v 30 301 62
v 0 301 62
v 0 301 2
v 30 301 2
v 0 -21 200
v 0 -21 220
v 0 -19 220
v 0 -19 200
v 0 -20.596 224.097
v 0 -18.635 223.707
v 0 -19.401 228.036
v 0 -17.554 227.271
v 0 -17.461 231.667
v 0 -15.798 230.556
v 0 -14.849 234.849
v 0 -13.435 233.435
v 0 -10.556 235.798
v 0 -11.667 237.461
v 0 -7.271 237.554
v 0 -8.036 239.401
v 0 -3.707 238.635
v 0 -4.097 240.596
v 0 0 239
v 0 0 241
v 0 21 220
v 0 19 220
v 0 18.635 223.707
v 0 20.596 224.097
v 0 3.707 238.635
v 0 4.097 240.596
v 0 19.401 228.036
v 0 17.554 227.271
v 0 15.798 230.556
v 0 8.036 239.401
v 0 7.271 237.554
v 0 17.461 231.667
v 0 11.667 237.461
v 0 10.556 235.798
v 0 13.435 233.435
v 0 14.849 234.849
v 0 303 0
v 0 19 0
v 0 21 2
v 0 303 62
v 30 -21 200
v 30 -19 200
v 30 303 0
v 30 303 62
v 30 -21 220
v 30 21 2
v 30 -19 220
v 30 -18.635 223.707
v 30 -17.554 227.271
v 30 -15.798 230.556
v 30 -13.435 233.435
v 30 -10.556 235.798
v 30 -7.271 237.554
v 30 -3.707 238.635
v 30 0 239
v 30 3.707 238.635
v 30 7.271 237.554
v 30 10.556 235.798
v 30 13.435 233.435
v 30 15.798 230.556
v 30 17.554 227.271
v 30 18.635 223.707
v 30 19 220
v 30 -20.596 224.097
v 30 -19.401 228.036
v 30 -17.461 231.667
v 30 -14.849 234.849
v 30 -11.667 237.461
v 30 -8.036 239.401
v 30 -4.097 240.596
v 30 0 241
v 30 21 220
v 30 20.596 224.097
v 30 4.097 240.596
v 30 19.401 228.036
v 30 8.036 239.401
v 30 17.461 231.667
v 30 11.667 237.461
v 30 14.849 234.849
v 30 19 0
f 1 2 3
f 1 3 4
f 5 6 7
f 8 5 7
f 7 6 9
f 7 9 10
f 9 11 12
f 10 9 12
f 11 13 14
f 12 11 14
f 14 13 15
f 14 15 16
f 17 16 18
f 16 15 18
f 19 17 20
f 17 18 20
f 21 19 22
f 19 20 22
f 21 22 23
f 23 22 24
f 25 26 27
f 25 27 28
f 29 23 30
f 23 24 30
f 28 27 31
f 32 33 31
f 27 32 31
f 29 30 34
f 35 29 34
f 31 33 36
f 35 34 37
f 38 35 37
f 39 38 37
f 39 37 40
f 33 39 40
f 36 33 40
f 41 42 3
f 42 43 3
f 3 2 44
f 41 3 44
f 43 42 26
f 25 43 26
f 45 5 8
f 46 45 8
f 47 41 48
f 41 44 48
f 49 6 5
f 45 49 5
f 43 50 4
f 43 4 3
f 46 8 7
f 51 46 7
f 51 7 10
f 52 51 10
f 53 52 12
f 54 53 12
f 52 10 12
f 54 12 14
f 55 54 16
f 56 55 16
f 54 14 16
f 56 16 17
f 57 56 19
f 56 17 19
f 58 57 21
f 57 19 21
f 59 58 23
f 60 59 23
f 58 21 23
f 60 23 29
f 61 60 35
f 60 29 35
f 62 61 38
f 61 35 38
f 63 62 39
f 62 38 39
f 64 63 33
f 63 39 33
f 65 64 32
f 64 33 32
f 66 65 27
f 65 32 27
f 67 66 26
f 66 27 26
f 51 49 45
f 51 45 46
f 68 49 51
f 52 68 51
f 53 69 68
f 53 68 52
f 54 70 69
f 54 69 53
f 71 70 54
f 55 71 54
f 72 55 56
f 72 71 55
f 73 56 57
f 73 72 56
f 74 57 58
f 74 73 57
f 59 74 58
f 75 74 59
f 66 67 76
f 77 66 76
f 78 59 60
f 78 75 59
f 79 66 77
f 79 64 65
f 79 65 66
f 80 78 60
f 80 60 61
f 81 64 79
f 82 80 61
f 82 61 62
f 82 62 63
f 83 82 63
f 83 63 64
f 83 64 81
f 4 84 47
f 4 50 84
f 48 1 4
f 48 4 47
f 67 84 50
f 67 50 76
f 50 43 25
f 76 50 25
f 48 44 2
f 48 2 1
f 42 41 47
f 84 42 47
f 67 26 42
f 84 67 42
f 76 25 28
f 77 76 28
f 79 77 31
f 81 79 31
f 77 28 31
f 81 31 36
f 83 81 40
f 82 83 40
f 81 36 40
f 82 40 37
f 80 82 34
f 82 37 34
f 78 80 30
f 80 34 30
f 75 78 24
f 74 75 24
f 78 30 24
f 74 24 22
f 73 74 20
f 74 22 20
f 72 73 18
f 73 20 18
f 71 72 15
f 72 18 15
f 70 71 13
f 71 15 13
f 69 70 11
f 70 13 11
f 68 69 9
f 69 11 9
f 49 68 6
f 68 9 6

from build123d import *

# Parameters (mm, degrees)
F1_DEPTH      = 30
F2_W          = 30
F2_H          = 2
F3_DEPTH      = 280
F4_W          = 30
F4_H          = 2
F5_DEPTH      = 60
F5_DEPTH_BACK = 2


with BuildPart() as f1:
    # F0 (on Right) → F1 (new body)
    with BuildSketch(Plane.YZ):
        with BuildLine():
            ThreePointArc((-19, 220), (0, 239), (19, 220))
            Line((19, 220), (19, 0))
            Line((19, 0), (21, 0))
            Line((21, 0), (21, 220))
            ThreePointArc((21, 220), (0, 241), (-21, 220))
            Line((-21, 220), (-21, 200))
            Line((-21, 200), (-19, 200))
            Line((-19, 200), (-19, 220))
        make_face()
    extrude(amount=F1_DEPTH)

    # F2 (on face) → F3 (join)
    with BuildSketch(Plane(origin=(0, 21, 0), x_dir=(-1, 0, 0), z_dir=(0, 1, 0))):
        with Locations((-15, 1)):
            Rectangle(F2_W, F2_H)
    extrude(amount=F3_DEPTH)

    # F4 (on face) → F5 (join, two sides)
    with BuildSketch(Plane.XY.offset(2)) as f5_sk:
        with Locations((15, 302)):
            Rectangle(F4_W, F4_H)
    extrude(amount=F5_DEPTH)
    extrude(f5_sk.sketch, amount=-F5_DEPTH_BACK)


solid = f1.part
